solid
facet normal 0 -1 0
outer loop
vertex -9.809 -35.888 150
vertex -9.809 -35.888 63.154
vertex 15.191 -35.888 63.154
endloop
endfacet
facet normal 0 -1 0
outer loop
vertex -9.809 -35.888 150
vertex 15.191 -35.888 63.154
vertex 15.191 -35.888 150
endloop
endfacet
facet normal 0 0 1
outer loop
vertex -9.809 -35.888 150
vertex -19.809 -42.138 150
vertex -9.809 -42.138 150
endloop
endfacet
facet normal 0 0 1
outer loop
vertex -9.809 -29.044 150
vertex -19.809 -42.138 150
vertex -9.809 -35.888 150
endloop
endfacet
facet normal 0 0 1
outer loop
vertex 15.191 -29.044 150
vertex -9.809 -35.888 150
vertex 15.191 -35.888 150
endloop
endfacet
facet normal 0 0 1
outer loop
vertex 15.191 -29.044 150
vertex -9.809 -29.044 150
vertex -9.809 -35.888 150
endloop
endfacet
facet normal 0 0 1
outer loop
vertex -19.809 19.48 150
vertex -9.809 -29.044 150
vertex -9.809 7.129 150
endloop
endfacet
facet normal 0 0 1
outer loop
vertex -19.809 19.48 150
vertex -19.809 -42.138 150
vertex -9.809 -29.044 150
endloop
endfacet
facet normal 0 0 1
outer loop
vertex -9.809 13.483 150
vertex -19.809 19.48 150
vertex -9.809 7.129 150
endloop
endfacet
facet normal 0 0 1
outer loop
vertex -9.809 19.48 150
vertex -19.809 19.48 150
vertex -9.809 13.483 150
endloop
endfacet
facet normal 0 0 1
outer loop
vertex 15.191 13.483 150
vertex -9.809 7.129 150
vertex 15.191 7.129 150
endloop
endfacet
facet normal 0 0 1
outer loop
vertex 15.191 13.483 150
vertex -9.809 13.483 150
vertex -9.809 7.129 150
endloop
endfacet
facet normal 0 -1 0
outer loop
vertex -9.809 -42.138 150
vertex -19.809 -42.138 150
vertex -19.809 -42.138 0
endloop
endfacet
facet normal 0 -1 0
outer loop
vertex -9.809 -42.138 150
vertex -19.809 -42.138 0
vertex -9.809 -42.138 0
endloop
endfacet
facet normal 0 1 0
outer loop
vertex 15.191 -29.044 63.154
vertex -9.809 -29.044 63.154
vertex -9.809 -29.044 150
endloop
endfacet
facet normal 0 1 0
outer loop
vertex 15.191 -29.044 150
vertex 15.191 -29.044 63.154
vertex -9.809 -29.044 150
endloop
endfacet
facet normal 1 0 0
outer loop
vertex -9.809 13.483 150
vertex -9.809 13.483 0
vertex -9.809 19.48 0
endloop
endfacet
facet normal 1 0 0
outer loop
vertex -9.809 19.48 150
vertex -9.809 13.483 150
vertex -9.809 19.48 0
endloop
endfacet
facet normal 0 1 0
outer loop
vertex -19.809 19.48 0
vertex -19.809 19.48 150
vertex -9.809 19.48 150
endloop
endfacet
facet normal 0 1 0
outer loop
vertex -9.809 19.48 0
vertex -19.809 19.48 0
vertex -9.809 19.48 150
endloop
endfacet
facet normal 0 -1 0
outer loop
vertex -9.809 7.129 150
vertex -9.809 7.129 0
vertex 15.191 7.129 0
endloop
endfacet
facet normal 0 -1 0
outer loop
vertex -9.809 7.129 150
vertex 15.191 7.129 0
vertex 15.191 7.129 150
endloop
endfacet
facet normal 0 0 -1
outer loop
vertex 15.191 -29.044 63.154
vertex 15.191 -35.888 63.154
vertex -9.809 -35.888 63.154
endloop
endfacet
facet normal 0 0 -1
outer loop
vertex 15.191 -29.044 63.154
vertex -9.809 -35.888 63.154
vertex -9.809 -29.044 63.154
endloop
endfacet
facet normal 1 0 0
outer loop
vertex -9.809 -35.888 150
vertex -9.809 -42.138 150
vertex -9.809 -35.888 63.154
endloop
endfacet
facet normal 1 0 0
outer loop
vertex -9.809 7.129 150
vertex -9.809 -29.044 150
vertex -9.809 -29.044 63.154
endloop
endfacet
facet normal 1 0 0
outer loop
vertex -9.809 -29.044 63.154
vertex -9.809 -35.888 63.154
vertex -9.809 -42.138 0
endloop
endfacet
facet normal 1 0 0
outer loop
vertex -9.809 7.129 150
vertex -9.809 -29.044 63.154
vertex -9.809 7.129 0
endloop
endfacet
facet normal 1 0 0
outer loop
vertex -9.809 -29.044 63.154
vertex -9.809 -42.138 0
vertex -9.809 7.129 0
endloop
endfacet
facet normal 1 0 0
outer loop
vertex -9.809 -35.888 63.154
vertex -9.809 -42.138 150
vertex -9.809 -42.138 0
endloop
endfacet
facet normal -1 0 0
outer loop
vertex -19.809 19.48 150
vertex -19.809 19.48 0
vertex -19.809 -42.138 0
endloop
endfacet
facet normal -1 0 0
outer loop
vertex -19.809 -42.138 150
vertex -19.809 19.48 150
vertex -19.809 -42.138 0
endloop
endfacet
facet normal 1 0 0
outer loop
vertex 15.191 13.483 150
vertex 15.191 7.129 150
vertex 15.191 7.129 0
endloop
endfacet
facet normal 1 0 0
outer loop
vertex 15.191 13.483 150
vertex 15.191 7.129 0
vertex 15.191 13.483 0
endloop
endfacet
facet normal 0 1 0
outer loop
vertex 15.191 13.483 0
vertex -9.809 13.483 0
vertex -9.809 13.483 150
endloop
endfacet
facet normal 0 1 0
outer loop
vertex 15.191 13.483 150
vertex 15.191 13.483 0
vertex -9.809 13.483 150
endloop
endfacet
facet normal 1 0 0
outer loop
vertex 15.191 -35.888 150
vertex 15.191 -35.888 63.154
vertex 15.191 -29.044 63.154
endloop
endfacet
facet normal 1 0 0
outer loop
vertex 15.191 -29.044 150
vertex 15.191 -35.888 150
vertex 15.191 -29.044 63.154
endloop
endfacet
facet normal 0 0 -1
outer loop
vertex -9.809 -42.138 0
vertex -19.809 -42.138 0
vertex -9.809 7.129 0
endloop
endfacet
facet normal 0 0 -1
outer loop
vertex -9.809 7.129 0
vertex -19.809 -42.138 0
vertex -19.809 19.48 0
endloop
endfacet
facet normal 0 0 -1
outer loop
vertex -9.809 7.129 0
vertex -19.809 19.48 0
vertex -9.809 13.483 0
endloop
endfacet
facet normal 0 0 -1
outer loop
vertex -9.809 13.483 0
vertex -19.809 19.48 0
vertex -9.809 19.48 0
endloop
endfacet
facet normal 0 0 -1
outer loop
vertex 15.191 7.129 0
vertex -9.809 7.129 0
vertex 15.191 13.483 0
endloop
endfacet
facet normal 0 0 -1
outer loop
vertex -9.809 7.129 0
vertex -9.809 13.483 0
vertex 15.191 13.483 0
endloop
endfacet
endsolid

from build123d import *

# Parameters (mm, degrees)
F0_W     = 10
F0_H     = 41.6184230894
F0_H_2   = 20
F1_DEPTH = 150
F2_W     = 6.3547044992
F2_H     = 150
F2_W_2   = 6.8435370922
F2_H_2   = 86.8458472192
F3_DEPTH = 25


with BuildPart() as f1:
    # F0 (on Top) → F1 (new body)
    with BuildSketch(Plane.XY):
        with Locations((-14.8092108965, -1.3289477304)):
            Rectangle(F0_W, F0_H)
        with Locations((-14.8092108965, -32.1381592751)):
            Rectangle(F0_W, F0_H_2)
    extrude(amount=F1_DEPTH)

    # F2 (on face) → F3 (join)
    with BuildSketch(Plane.YZ.offset(-9.8092108965)):
        with Locations((10.3059485555, 75)):
            Rectangle(F2_W, F2_H)
        with Locations((-32.4661172926, 106.5770763904)):
            Rectangle(F2_W_2, F2_H_2)
    extrude(amount=F3_DEPTH)


solid = f1.part
